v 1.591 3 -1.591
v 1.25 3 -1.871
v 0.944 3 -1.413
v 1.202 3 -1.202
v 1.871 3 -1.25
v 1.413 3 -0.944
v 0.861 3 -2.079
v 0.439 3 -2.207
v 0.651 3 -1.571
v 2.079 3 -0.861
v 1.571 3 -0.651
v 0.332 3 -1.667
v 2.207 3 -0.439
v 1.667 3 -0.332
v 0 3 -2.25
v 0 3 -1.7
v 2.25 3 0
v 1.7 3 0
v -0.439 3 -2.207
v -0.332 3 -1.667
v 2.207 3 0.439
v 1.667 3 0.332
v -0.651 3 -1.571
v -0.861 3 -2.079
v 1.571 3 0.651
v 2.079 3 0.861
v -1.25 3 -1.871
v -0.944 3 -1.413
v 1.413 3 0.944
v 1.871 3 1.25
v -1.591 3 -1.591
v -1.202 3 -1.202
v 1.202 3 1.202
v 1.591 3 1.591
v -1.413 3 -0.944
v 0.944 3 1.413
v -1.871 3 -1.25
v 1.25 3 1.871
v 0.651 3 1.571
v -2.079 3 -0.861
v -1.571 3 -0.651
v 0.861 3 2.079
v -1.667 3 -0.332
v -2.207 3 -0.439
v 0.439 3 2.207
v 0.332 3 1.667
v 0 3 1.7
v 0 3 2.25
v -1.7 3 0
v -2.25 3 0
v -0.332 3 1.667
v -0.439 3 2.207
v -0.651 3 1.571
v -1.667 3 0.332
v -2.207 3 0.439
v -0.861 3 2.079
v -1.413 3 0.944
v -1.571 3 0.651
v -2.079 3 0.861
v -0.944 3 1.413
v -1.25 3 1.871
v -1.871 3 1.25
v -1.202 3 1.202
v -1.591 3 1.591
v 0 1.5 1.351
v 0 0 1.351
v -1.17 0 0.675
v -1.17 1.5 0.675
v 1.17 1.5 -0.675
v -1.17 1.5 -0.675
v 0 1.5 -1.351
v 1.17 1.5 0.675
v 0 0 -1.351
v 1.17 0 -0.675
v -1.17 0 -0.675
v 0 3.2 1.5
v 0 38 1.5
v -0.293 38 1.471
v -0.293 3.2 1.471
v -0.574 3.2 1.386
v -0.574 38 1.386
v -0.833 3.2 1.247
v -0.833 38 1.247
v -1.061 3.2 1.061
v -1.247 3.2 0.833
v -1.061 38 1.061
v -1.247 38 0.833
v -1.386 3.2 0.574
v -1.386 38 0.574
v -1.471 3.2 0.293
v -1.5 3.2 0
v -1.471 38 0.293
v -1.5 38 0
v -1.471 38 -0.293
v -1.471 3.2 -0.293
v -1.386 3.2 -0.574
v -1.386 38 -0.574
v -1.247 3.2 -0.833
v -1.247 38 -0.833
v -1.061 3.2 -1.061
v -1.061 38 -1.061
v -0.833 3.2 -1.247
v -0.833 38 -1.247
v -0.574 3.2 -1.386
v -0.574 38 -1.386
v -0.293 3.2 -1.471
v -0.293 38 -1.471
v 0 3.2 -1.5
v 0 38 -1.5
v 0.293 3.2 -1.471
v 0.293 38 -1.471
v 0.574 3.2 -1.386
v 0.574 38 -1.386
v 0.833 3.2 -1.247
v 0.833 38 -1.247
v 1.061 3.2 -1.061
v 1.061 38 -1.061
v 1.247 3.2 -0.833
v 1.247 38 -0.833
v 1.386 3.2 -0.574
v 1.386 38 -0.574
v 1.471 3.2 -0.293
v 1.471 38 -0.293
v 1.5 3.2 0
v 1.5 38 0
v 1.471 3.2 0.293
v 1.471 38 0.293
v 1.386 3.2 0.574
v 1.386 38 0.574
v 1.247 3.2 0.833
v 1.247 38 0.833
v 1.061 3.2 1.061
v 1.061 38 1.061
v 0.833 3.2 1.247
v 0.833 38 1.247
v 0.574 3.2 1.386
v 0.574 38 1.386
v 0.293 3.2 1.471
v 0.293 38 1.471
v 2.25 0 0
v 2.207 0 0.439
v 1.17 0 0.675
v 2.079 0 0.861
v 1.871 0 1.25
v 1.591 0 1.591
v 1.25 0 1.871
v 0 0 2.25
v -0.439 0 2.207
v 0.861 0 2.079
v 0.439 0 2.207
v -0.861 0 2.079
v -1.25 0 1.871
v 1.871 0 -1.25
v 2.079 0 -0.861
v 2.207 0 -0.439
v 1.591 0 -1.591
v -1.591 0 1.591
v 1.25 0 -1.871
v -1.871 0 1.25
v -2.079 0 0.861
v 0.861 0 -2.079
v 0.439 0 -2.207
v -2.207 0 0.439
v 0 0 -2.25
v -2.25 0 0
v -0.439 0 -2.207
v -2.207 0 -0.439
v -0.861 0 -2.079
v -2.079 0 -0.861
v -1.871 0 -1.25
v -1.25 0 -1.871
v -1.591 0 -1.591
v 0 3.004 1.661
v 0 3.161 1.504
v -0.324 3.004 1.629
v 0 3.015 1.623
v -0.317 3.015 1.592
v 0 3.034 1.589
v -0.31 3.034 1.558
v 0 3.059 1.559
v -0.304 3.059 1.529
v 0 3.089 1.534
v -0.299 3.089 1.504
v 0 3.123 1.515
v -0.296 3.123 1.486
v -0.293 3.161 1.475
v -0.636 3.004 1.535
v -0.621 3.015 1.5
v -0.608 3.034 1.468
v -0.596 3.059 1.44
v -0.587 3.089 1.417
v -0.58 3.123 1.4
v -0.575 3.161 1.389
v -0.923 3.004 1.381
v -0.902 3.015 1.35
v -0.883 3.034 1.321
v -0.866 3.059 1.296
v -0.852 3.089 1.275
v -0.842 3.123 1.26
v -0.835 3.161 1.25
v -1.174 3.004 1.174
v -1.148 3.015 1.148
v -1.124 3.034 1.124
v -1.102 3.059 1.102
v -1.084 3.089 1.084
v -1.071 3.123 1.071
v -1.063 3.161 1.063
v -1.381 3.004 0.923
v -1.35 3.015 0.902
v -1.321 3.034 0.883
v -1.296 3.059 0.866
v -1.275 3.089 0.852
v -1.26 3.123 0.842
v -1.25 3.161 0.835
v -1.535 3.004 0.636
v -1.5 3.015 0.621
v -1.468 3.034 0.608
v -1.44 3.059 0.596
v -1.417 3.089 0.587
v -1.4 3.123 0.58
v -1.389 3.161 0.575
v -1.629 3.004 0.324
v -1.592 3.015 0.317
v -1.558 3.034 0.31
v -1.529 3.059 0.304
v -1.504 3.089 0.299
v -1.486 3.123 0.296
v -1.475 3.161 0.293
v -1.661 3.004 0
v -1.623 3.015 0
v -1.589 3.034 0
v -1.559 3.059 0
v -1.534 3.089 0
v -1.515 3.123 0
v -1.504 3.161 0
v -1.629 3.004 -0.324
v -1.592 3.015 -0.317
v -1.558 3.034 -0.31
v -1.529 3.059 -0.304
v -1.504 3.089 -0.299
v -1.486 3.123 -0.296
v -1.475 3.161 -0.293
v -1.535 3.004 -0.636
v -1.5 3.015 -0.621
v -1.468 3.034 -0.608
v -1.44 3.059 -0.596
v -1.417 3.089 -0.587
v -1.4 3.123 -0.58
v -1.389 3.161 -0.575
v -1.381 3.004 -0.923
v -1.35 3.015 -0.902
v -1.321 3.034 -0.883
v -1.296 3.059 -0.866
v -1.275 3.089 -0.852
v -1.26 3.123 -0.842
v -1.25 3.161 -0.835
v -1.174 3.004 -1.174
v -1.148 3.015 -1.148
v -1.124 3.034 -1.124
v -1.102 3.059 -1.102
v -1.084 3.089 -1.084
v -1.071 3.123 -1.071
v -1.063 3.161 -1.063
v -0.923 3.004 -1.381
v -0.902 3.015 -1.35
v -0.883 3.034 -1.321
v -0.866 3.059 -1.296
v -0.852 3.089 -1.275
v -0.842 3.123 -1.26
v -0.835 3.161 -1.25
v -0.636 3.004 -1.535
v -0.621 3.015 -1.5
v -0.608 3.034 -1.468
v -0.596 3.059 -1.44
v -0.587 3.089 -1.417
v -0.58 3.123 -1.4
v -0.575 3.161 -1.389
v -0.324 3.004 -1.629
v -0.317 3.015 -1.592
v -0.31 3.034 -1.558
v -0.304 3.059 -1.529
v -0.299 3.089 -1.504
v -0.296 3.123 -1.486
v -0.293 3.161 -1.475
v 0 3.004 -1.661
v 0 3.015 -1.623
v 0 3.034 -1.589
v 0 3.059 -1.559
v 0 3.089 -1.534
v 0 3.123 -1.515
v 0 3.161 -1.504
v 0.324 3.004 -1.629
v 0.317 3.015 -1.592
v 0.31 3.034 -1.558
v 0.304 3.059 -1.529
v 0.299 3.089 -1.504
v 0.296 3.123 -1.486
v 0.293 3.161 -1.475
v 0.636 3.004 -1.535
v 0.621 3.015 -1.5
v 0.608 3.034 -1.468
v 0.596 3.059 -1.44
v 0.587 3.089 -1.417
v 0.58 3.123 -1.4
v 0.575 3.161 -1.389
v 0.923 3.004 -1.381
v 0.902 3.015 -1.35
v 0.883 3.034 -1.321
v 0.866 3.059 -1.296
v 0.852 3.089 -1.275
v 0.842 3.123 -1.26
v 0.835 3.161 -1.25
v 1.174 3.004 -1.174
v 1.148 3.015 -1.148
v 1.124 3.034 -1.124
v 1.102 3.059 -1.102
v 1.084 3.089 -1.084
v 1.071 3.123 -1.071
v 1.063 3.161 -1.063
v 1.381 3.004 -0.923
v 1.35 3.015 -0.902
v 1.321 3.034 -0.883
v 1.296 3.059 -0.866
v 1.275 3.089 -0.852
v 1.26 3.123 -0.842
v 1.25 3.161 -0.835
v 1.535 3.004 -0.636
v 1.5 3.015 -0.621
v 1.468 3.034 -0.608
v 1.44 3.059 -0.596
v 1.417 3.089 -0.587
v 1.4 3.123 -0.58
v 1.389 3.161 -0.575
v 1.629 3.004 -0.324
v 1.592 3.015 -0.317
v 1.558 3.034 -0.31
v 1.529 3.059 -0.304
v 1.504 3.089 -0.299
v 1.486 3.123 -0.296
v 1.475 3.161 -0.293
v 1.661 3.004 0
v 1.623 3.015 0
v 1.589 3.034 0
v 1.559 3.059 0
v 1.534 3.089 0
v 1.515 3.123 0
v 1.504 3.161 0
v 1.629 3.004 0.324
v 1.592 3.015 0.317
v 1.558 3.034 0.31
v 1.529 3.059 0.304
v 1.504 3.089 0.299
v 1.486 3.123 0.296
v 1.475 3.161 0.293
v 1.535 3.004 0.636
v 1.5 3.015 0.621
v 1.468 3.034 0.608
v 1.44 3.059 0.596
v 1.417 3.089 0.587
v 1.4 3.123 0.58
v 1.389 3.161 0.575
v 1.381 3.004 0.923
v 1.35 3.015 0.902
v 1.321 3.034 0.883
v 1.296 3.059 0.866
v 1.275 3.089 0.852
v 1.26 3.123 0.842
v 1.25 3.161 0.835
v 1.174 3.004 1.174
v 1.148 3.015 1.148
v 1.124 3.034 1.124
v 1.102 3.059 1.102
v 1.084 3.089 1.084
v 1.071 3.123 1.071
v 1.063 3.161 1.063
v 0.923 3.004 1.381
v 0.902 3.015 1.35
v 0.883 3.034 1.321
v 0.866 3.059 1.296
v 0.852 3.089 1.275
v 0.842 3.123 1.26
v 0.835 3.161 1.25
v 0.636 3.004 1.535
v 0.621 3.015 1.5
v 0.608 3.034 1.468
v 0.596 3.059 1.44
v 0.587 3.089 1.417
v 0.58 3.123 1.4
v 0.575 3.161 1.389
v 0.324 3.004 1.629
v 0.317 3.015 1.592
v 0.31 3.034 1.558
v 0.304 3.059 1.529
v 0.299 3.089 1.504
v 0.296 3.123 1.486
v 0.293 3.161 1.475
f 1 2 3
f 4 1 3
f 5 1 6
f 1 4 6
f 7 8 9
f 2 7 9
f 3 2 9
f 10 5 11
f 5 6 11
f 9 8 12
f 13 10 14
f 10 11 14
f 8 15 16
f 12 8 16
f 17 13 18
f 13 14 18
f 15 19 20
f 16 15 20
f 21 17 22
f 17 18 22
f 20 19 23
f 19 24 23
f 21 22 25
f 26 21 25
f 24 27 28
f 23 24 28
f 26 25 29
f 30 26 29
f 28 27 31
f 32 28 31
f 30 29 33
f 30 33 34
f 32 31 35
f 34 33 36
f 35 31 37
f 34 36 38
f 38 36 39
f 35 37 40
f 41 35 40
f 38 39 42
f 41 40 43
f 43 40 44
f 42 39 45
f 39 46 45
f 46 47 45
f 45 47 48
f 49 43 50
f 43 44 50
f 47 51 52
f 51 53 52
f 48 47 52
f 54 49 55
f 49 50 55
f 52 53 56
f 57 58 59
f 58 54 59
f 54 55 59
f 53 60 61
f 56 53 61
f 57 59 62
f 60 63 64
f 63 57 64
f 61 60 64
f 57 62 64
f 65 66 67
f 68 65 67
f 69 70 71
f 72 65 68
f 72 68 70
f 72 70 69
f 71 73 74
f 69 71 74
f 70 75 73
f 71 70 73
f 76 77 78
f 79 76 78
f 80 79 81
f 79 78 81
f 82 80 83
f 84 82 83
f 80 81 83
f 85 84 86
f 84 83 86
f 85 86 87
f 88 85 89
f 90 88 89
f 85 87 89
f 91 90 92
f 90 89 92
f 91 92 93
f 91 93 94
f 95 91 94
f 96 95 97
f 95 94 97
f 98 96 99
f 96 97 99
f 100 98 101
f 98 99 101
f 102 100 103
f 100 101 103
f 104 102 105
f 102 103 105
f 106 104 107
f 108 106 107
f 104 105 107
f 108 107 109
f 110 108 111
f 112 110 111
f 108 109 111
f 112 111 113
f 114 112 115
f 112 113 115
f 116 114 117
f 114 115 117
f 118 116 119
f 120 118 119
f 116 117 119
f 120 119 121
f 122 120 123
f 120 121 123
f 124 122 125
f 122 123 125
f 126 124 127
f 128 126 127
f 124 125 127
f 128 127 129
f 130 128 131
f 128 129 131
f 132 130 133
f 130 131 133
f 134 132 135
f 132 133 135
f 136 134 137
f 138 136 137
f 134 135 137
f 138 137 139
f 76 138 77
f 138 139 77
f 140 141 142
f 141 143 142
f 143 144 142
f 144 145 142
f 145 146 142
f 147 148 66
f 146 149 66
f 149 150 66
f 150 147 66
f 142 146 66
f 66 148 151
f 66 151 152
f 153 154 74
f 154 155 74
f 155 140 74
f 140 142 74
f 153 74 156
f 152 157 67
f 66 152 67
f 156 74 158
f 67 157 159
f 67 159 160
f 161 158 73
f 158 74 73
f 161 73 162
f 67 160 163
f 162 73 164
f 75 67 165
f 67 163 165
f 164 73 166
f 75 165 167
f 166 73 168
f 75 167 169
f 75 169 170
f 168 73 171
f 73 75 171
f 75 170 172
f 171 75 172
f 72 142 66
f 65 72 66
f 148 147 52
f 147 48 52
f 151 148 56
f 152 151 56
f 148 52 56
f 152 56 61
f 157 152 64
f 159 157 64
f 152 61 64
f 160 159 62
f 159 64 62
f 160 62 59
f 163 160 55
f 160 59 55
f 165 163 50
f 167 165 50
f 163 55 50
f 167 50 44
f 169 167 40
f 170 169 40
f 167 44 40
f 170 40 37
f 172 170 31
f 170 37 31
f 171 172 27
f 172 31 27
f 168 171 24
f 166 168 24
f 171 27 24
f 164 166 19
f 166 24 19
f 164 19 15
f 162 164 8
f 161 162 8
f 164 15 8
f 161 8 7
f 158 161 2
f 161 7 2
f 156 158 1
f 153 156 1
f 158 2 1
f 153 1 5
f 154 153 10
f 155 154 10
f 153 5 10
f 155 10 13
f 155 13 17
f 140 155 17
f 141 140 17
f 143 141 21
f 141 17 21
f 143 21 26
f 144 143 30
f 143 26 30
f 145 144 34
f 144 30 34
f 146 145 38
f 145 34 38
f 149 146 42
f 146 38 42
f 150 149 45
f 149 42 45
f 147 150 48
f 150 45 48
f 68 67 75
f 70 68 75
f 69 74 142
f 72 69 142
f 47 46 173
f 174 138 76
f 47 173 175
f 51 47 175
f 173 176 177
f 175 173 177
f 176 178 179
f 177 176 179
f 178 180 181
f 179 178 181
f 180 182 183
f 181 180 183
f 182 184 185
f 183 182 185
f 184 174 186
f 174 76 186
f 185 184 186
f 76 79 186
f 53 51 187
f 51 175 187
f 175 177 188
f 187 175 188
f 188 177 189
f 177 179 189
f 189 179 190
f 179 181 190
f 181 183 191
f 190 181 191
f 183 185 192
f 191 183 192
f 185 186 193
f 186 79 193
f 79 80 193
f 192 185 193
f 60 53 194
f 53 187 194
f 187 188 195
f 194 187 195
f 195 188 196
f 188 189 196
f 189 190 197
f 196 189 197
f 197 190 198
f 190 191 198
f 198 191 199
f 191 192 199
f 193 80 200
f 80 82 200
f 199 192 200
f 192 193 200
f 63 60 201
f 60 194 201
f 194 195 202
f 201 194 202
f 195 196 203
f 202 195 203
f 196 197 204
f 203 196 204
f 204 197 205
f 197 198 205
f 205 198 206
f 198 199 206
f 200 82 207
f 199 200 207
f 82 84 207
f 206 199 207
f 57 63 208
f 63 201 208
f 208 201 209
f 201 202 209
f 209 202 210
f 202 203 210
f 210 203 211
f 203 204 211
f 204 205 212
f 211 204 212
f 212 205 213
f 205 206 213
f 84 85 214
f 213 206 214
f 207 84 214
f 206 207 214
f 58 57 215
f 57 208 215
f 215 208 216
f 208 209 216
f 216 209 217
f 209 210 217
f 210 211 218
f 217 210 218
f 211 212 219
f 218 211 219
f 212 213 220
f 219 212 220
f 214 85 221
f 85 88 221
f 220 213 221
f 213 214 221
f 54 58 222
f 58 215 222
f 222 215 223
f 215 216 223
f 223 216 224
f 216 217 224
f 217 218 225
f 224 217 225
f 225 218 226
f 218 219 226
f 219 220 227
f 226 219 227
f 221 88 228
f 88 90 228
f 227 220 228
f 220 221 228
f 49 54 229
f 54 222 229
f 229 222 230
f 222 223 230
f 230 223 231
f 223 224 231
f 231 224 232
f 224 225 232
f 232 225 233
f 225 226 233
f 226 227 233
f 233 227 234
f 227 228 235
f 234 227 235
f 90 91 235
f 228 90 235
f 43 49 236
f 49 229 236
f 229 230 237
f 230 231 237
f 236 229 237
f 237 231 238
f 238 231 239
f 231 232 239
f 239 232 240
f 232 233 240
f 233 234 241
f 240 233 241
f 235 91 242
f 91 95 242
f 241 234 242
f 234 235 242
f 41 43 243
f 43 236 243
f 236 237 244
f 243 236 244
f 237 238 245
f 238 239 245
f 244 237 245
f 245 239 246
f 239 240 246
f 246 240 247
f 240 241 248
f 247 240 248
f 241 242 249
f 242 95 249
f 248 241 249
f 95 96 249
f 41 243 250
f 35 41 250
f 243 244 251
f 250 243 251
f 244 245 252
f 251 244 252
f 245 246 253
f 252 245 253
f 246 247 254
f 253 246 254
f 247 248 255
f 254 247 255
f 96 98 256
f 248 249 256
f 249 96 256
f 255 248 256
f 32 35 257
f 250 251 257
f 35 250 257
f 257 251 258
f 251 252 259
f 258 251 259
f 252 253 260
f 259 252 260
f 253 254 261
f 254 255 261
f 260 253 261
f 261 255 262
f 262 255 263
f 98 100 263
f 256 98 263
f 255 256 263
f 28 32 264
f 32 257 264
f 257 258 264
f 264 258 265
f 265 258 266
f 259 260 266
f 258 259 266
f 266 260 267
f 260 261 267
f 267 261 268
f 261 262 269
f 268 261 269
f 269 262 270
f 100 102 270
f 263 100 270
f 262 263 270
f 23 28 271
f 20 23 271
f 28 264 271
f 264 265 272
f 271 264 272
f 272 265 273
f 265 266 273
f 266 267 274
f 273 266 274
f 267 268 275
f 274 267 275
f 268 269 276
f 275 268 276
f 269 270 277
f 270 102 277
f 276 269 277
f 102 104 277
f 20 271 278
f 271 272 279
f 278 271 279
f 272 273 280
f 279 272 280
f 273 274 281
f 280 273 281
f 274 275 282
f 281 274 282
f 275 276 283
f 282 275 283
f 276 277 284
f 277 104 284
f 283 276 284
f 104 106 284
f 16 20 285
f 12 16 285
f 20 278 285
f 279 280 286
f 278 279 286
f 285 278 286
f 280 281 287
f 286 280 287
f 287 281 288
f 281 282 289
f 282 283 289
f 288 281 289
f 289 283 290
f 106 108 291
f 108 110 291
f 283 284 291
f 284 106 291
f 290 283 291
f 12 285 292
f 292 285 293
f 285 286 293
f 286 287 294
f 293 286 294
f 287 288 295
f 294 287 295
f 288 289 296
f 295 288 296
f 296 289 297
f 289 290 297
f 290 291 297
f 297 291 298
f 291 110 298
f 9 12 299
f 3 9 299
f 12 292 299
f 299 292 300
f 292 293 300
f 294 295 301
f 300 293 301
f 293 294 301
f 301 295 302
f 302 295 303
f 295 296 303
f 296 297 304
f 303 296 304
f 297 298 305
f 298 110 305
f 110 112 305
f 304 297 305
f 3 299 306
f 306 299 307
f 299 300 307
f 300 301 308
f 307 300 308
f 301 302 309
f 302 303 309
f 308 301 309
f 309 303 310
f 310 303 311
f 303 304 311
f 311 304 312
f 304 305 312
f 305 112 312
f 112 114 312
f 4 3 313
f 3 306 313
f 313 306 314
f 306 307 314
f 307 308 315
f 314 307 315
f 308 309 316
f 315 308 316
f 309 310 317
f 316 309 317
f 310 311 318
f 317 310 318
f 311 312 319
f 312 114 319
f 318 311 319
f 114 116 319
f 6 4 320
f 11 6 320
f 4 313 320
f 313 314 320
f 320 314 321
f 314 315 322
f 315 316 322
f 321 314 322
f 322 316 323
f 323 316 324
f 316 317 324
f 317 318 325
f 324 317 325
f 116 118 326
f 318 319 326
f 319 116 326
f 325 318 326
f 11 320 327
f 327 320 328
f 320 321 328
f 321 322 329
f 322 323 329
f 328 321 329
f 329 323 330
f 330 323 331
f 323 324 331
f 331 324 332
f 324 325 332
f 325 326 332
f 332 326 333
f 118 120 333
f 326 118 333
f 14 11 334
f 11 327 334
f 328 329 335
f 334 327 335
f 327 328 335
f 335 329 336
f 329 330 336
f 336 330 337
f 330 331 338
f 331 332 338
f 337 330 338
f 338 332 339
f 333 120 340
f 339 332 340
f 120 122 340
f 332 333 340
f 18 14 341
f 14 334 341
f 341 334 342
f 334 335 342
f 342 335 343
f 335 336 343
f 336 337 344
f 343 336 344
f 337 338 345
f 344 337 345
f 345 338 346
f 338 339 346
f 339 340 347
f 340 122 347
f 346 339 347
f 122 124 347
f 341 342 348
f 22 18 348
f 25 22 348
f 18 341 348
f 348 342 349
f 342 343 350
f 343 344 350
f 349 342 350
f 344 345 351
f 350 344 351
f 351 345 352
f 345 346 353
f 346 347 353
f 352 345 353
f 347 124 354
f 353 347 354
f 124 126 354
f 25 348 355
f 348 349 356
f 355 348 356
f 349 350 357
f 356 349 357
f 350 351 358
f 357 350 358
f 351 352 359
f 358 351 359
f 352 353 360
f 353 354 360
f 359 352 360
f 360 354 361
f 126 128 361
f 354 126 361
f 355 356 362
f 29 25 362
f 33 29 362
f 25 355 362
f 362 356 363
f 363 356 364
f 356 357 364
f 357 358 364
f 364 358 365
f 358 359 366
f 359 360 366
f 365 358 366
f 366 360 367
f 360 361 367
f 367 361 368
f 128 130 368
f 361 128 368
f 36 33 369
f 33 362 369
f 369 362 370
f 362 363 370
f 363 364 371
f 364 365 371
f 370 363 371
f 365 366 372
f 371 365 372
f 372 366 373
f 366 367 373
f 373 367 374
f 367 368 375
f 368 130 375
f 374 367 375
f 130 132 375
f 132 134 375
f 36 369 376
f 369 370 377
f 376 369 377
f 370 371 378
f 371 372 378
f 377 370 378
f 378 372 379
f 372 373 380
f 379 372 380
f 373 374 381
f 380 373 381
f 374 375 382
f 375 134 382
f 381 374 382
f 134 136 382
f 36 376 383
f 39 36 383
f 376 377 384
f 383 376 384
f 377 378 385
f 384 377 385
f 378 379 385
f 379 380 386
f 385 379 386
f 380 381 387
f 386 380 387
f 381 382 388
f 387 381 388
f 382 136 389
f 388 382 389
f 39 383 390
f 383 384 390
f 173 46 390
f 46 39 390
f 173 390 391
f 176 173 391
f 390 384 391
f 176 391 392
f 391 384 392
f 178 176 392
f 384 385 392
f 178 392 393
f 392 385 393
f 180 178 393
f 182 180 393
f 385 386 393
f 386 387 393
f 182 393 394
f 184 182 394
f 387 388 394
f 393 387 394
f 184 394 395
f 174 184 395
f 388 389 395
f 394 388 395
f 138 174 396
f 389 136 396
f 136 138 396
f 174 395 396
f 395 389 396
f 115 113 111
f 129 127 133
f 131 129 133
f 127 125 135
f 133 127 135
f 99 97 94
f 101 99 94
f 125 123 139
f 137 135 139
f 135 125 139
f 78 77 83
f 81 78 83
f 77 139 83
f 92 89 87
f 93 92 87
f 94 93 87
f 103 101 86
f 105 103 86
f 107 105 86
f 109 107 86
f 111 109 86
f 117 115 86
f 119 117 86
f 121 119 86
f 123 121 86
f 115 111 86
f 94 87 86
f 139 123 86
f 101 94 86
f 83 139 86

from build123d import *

# Parameters (mm, degrees)
FILLET_1_R          = 0.2
CUT_EXTRUDE_1_DEPTH = 1.5


with BuildPart() as part:
    # 草图1 → 旋转1 (revolve)
    with BuildSketch(Plane(origin=(0, 0, 0), x_dir=(0, 0, -1), z_dir=(1, 0, 0))):
        Polygon((0, 0), (-2.25, 0), (-2.25, 3), (-1.5, 3), (-1.5, 38), (0, 38), align=None)
    revolve(axis=Axis((0, 38, 0), (0, -1, 0)))

    # 圆角1
    fillet_1_edges = [part.edges().sort_by_distance(p)[0] for p in [
        (0, 3, -1.5),
    ]]
    fillet(fillet_1_edges, radius=FILLET_1_R)

    # 草图2 → 切除-拉伸1 (cut)
    with BuildSketch(Plane.XZ):
        Polygon((0, 1.35099963), (-1.17, 0.675499815), (-1.17, -0.675499815), (0, -1.35099963), (1.17, -0.675499815), (1.17, 0.675499815), align=None)
    extrude(amount=-CUT_EXTRUDE_1_DEPTH, mode=Mode.SUBTRACT)


solid = part.part
